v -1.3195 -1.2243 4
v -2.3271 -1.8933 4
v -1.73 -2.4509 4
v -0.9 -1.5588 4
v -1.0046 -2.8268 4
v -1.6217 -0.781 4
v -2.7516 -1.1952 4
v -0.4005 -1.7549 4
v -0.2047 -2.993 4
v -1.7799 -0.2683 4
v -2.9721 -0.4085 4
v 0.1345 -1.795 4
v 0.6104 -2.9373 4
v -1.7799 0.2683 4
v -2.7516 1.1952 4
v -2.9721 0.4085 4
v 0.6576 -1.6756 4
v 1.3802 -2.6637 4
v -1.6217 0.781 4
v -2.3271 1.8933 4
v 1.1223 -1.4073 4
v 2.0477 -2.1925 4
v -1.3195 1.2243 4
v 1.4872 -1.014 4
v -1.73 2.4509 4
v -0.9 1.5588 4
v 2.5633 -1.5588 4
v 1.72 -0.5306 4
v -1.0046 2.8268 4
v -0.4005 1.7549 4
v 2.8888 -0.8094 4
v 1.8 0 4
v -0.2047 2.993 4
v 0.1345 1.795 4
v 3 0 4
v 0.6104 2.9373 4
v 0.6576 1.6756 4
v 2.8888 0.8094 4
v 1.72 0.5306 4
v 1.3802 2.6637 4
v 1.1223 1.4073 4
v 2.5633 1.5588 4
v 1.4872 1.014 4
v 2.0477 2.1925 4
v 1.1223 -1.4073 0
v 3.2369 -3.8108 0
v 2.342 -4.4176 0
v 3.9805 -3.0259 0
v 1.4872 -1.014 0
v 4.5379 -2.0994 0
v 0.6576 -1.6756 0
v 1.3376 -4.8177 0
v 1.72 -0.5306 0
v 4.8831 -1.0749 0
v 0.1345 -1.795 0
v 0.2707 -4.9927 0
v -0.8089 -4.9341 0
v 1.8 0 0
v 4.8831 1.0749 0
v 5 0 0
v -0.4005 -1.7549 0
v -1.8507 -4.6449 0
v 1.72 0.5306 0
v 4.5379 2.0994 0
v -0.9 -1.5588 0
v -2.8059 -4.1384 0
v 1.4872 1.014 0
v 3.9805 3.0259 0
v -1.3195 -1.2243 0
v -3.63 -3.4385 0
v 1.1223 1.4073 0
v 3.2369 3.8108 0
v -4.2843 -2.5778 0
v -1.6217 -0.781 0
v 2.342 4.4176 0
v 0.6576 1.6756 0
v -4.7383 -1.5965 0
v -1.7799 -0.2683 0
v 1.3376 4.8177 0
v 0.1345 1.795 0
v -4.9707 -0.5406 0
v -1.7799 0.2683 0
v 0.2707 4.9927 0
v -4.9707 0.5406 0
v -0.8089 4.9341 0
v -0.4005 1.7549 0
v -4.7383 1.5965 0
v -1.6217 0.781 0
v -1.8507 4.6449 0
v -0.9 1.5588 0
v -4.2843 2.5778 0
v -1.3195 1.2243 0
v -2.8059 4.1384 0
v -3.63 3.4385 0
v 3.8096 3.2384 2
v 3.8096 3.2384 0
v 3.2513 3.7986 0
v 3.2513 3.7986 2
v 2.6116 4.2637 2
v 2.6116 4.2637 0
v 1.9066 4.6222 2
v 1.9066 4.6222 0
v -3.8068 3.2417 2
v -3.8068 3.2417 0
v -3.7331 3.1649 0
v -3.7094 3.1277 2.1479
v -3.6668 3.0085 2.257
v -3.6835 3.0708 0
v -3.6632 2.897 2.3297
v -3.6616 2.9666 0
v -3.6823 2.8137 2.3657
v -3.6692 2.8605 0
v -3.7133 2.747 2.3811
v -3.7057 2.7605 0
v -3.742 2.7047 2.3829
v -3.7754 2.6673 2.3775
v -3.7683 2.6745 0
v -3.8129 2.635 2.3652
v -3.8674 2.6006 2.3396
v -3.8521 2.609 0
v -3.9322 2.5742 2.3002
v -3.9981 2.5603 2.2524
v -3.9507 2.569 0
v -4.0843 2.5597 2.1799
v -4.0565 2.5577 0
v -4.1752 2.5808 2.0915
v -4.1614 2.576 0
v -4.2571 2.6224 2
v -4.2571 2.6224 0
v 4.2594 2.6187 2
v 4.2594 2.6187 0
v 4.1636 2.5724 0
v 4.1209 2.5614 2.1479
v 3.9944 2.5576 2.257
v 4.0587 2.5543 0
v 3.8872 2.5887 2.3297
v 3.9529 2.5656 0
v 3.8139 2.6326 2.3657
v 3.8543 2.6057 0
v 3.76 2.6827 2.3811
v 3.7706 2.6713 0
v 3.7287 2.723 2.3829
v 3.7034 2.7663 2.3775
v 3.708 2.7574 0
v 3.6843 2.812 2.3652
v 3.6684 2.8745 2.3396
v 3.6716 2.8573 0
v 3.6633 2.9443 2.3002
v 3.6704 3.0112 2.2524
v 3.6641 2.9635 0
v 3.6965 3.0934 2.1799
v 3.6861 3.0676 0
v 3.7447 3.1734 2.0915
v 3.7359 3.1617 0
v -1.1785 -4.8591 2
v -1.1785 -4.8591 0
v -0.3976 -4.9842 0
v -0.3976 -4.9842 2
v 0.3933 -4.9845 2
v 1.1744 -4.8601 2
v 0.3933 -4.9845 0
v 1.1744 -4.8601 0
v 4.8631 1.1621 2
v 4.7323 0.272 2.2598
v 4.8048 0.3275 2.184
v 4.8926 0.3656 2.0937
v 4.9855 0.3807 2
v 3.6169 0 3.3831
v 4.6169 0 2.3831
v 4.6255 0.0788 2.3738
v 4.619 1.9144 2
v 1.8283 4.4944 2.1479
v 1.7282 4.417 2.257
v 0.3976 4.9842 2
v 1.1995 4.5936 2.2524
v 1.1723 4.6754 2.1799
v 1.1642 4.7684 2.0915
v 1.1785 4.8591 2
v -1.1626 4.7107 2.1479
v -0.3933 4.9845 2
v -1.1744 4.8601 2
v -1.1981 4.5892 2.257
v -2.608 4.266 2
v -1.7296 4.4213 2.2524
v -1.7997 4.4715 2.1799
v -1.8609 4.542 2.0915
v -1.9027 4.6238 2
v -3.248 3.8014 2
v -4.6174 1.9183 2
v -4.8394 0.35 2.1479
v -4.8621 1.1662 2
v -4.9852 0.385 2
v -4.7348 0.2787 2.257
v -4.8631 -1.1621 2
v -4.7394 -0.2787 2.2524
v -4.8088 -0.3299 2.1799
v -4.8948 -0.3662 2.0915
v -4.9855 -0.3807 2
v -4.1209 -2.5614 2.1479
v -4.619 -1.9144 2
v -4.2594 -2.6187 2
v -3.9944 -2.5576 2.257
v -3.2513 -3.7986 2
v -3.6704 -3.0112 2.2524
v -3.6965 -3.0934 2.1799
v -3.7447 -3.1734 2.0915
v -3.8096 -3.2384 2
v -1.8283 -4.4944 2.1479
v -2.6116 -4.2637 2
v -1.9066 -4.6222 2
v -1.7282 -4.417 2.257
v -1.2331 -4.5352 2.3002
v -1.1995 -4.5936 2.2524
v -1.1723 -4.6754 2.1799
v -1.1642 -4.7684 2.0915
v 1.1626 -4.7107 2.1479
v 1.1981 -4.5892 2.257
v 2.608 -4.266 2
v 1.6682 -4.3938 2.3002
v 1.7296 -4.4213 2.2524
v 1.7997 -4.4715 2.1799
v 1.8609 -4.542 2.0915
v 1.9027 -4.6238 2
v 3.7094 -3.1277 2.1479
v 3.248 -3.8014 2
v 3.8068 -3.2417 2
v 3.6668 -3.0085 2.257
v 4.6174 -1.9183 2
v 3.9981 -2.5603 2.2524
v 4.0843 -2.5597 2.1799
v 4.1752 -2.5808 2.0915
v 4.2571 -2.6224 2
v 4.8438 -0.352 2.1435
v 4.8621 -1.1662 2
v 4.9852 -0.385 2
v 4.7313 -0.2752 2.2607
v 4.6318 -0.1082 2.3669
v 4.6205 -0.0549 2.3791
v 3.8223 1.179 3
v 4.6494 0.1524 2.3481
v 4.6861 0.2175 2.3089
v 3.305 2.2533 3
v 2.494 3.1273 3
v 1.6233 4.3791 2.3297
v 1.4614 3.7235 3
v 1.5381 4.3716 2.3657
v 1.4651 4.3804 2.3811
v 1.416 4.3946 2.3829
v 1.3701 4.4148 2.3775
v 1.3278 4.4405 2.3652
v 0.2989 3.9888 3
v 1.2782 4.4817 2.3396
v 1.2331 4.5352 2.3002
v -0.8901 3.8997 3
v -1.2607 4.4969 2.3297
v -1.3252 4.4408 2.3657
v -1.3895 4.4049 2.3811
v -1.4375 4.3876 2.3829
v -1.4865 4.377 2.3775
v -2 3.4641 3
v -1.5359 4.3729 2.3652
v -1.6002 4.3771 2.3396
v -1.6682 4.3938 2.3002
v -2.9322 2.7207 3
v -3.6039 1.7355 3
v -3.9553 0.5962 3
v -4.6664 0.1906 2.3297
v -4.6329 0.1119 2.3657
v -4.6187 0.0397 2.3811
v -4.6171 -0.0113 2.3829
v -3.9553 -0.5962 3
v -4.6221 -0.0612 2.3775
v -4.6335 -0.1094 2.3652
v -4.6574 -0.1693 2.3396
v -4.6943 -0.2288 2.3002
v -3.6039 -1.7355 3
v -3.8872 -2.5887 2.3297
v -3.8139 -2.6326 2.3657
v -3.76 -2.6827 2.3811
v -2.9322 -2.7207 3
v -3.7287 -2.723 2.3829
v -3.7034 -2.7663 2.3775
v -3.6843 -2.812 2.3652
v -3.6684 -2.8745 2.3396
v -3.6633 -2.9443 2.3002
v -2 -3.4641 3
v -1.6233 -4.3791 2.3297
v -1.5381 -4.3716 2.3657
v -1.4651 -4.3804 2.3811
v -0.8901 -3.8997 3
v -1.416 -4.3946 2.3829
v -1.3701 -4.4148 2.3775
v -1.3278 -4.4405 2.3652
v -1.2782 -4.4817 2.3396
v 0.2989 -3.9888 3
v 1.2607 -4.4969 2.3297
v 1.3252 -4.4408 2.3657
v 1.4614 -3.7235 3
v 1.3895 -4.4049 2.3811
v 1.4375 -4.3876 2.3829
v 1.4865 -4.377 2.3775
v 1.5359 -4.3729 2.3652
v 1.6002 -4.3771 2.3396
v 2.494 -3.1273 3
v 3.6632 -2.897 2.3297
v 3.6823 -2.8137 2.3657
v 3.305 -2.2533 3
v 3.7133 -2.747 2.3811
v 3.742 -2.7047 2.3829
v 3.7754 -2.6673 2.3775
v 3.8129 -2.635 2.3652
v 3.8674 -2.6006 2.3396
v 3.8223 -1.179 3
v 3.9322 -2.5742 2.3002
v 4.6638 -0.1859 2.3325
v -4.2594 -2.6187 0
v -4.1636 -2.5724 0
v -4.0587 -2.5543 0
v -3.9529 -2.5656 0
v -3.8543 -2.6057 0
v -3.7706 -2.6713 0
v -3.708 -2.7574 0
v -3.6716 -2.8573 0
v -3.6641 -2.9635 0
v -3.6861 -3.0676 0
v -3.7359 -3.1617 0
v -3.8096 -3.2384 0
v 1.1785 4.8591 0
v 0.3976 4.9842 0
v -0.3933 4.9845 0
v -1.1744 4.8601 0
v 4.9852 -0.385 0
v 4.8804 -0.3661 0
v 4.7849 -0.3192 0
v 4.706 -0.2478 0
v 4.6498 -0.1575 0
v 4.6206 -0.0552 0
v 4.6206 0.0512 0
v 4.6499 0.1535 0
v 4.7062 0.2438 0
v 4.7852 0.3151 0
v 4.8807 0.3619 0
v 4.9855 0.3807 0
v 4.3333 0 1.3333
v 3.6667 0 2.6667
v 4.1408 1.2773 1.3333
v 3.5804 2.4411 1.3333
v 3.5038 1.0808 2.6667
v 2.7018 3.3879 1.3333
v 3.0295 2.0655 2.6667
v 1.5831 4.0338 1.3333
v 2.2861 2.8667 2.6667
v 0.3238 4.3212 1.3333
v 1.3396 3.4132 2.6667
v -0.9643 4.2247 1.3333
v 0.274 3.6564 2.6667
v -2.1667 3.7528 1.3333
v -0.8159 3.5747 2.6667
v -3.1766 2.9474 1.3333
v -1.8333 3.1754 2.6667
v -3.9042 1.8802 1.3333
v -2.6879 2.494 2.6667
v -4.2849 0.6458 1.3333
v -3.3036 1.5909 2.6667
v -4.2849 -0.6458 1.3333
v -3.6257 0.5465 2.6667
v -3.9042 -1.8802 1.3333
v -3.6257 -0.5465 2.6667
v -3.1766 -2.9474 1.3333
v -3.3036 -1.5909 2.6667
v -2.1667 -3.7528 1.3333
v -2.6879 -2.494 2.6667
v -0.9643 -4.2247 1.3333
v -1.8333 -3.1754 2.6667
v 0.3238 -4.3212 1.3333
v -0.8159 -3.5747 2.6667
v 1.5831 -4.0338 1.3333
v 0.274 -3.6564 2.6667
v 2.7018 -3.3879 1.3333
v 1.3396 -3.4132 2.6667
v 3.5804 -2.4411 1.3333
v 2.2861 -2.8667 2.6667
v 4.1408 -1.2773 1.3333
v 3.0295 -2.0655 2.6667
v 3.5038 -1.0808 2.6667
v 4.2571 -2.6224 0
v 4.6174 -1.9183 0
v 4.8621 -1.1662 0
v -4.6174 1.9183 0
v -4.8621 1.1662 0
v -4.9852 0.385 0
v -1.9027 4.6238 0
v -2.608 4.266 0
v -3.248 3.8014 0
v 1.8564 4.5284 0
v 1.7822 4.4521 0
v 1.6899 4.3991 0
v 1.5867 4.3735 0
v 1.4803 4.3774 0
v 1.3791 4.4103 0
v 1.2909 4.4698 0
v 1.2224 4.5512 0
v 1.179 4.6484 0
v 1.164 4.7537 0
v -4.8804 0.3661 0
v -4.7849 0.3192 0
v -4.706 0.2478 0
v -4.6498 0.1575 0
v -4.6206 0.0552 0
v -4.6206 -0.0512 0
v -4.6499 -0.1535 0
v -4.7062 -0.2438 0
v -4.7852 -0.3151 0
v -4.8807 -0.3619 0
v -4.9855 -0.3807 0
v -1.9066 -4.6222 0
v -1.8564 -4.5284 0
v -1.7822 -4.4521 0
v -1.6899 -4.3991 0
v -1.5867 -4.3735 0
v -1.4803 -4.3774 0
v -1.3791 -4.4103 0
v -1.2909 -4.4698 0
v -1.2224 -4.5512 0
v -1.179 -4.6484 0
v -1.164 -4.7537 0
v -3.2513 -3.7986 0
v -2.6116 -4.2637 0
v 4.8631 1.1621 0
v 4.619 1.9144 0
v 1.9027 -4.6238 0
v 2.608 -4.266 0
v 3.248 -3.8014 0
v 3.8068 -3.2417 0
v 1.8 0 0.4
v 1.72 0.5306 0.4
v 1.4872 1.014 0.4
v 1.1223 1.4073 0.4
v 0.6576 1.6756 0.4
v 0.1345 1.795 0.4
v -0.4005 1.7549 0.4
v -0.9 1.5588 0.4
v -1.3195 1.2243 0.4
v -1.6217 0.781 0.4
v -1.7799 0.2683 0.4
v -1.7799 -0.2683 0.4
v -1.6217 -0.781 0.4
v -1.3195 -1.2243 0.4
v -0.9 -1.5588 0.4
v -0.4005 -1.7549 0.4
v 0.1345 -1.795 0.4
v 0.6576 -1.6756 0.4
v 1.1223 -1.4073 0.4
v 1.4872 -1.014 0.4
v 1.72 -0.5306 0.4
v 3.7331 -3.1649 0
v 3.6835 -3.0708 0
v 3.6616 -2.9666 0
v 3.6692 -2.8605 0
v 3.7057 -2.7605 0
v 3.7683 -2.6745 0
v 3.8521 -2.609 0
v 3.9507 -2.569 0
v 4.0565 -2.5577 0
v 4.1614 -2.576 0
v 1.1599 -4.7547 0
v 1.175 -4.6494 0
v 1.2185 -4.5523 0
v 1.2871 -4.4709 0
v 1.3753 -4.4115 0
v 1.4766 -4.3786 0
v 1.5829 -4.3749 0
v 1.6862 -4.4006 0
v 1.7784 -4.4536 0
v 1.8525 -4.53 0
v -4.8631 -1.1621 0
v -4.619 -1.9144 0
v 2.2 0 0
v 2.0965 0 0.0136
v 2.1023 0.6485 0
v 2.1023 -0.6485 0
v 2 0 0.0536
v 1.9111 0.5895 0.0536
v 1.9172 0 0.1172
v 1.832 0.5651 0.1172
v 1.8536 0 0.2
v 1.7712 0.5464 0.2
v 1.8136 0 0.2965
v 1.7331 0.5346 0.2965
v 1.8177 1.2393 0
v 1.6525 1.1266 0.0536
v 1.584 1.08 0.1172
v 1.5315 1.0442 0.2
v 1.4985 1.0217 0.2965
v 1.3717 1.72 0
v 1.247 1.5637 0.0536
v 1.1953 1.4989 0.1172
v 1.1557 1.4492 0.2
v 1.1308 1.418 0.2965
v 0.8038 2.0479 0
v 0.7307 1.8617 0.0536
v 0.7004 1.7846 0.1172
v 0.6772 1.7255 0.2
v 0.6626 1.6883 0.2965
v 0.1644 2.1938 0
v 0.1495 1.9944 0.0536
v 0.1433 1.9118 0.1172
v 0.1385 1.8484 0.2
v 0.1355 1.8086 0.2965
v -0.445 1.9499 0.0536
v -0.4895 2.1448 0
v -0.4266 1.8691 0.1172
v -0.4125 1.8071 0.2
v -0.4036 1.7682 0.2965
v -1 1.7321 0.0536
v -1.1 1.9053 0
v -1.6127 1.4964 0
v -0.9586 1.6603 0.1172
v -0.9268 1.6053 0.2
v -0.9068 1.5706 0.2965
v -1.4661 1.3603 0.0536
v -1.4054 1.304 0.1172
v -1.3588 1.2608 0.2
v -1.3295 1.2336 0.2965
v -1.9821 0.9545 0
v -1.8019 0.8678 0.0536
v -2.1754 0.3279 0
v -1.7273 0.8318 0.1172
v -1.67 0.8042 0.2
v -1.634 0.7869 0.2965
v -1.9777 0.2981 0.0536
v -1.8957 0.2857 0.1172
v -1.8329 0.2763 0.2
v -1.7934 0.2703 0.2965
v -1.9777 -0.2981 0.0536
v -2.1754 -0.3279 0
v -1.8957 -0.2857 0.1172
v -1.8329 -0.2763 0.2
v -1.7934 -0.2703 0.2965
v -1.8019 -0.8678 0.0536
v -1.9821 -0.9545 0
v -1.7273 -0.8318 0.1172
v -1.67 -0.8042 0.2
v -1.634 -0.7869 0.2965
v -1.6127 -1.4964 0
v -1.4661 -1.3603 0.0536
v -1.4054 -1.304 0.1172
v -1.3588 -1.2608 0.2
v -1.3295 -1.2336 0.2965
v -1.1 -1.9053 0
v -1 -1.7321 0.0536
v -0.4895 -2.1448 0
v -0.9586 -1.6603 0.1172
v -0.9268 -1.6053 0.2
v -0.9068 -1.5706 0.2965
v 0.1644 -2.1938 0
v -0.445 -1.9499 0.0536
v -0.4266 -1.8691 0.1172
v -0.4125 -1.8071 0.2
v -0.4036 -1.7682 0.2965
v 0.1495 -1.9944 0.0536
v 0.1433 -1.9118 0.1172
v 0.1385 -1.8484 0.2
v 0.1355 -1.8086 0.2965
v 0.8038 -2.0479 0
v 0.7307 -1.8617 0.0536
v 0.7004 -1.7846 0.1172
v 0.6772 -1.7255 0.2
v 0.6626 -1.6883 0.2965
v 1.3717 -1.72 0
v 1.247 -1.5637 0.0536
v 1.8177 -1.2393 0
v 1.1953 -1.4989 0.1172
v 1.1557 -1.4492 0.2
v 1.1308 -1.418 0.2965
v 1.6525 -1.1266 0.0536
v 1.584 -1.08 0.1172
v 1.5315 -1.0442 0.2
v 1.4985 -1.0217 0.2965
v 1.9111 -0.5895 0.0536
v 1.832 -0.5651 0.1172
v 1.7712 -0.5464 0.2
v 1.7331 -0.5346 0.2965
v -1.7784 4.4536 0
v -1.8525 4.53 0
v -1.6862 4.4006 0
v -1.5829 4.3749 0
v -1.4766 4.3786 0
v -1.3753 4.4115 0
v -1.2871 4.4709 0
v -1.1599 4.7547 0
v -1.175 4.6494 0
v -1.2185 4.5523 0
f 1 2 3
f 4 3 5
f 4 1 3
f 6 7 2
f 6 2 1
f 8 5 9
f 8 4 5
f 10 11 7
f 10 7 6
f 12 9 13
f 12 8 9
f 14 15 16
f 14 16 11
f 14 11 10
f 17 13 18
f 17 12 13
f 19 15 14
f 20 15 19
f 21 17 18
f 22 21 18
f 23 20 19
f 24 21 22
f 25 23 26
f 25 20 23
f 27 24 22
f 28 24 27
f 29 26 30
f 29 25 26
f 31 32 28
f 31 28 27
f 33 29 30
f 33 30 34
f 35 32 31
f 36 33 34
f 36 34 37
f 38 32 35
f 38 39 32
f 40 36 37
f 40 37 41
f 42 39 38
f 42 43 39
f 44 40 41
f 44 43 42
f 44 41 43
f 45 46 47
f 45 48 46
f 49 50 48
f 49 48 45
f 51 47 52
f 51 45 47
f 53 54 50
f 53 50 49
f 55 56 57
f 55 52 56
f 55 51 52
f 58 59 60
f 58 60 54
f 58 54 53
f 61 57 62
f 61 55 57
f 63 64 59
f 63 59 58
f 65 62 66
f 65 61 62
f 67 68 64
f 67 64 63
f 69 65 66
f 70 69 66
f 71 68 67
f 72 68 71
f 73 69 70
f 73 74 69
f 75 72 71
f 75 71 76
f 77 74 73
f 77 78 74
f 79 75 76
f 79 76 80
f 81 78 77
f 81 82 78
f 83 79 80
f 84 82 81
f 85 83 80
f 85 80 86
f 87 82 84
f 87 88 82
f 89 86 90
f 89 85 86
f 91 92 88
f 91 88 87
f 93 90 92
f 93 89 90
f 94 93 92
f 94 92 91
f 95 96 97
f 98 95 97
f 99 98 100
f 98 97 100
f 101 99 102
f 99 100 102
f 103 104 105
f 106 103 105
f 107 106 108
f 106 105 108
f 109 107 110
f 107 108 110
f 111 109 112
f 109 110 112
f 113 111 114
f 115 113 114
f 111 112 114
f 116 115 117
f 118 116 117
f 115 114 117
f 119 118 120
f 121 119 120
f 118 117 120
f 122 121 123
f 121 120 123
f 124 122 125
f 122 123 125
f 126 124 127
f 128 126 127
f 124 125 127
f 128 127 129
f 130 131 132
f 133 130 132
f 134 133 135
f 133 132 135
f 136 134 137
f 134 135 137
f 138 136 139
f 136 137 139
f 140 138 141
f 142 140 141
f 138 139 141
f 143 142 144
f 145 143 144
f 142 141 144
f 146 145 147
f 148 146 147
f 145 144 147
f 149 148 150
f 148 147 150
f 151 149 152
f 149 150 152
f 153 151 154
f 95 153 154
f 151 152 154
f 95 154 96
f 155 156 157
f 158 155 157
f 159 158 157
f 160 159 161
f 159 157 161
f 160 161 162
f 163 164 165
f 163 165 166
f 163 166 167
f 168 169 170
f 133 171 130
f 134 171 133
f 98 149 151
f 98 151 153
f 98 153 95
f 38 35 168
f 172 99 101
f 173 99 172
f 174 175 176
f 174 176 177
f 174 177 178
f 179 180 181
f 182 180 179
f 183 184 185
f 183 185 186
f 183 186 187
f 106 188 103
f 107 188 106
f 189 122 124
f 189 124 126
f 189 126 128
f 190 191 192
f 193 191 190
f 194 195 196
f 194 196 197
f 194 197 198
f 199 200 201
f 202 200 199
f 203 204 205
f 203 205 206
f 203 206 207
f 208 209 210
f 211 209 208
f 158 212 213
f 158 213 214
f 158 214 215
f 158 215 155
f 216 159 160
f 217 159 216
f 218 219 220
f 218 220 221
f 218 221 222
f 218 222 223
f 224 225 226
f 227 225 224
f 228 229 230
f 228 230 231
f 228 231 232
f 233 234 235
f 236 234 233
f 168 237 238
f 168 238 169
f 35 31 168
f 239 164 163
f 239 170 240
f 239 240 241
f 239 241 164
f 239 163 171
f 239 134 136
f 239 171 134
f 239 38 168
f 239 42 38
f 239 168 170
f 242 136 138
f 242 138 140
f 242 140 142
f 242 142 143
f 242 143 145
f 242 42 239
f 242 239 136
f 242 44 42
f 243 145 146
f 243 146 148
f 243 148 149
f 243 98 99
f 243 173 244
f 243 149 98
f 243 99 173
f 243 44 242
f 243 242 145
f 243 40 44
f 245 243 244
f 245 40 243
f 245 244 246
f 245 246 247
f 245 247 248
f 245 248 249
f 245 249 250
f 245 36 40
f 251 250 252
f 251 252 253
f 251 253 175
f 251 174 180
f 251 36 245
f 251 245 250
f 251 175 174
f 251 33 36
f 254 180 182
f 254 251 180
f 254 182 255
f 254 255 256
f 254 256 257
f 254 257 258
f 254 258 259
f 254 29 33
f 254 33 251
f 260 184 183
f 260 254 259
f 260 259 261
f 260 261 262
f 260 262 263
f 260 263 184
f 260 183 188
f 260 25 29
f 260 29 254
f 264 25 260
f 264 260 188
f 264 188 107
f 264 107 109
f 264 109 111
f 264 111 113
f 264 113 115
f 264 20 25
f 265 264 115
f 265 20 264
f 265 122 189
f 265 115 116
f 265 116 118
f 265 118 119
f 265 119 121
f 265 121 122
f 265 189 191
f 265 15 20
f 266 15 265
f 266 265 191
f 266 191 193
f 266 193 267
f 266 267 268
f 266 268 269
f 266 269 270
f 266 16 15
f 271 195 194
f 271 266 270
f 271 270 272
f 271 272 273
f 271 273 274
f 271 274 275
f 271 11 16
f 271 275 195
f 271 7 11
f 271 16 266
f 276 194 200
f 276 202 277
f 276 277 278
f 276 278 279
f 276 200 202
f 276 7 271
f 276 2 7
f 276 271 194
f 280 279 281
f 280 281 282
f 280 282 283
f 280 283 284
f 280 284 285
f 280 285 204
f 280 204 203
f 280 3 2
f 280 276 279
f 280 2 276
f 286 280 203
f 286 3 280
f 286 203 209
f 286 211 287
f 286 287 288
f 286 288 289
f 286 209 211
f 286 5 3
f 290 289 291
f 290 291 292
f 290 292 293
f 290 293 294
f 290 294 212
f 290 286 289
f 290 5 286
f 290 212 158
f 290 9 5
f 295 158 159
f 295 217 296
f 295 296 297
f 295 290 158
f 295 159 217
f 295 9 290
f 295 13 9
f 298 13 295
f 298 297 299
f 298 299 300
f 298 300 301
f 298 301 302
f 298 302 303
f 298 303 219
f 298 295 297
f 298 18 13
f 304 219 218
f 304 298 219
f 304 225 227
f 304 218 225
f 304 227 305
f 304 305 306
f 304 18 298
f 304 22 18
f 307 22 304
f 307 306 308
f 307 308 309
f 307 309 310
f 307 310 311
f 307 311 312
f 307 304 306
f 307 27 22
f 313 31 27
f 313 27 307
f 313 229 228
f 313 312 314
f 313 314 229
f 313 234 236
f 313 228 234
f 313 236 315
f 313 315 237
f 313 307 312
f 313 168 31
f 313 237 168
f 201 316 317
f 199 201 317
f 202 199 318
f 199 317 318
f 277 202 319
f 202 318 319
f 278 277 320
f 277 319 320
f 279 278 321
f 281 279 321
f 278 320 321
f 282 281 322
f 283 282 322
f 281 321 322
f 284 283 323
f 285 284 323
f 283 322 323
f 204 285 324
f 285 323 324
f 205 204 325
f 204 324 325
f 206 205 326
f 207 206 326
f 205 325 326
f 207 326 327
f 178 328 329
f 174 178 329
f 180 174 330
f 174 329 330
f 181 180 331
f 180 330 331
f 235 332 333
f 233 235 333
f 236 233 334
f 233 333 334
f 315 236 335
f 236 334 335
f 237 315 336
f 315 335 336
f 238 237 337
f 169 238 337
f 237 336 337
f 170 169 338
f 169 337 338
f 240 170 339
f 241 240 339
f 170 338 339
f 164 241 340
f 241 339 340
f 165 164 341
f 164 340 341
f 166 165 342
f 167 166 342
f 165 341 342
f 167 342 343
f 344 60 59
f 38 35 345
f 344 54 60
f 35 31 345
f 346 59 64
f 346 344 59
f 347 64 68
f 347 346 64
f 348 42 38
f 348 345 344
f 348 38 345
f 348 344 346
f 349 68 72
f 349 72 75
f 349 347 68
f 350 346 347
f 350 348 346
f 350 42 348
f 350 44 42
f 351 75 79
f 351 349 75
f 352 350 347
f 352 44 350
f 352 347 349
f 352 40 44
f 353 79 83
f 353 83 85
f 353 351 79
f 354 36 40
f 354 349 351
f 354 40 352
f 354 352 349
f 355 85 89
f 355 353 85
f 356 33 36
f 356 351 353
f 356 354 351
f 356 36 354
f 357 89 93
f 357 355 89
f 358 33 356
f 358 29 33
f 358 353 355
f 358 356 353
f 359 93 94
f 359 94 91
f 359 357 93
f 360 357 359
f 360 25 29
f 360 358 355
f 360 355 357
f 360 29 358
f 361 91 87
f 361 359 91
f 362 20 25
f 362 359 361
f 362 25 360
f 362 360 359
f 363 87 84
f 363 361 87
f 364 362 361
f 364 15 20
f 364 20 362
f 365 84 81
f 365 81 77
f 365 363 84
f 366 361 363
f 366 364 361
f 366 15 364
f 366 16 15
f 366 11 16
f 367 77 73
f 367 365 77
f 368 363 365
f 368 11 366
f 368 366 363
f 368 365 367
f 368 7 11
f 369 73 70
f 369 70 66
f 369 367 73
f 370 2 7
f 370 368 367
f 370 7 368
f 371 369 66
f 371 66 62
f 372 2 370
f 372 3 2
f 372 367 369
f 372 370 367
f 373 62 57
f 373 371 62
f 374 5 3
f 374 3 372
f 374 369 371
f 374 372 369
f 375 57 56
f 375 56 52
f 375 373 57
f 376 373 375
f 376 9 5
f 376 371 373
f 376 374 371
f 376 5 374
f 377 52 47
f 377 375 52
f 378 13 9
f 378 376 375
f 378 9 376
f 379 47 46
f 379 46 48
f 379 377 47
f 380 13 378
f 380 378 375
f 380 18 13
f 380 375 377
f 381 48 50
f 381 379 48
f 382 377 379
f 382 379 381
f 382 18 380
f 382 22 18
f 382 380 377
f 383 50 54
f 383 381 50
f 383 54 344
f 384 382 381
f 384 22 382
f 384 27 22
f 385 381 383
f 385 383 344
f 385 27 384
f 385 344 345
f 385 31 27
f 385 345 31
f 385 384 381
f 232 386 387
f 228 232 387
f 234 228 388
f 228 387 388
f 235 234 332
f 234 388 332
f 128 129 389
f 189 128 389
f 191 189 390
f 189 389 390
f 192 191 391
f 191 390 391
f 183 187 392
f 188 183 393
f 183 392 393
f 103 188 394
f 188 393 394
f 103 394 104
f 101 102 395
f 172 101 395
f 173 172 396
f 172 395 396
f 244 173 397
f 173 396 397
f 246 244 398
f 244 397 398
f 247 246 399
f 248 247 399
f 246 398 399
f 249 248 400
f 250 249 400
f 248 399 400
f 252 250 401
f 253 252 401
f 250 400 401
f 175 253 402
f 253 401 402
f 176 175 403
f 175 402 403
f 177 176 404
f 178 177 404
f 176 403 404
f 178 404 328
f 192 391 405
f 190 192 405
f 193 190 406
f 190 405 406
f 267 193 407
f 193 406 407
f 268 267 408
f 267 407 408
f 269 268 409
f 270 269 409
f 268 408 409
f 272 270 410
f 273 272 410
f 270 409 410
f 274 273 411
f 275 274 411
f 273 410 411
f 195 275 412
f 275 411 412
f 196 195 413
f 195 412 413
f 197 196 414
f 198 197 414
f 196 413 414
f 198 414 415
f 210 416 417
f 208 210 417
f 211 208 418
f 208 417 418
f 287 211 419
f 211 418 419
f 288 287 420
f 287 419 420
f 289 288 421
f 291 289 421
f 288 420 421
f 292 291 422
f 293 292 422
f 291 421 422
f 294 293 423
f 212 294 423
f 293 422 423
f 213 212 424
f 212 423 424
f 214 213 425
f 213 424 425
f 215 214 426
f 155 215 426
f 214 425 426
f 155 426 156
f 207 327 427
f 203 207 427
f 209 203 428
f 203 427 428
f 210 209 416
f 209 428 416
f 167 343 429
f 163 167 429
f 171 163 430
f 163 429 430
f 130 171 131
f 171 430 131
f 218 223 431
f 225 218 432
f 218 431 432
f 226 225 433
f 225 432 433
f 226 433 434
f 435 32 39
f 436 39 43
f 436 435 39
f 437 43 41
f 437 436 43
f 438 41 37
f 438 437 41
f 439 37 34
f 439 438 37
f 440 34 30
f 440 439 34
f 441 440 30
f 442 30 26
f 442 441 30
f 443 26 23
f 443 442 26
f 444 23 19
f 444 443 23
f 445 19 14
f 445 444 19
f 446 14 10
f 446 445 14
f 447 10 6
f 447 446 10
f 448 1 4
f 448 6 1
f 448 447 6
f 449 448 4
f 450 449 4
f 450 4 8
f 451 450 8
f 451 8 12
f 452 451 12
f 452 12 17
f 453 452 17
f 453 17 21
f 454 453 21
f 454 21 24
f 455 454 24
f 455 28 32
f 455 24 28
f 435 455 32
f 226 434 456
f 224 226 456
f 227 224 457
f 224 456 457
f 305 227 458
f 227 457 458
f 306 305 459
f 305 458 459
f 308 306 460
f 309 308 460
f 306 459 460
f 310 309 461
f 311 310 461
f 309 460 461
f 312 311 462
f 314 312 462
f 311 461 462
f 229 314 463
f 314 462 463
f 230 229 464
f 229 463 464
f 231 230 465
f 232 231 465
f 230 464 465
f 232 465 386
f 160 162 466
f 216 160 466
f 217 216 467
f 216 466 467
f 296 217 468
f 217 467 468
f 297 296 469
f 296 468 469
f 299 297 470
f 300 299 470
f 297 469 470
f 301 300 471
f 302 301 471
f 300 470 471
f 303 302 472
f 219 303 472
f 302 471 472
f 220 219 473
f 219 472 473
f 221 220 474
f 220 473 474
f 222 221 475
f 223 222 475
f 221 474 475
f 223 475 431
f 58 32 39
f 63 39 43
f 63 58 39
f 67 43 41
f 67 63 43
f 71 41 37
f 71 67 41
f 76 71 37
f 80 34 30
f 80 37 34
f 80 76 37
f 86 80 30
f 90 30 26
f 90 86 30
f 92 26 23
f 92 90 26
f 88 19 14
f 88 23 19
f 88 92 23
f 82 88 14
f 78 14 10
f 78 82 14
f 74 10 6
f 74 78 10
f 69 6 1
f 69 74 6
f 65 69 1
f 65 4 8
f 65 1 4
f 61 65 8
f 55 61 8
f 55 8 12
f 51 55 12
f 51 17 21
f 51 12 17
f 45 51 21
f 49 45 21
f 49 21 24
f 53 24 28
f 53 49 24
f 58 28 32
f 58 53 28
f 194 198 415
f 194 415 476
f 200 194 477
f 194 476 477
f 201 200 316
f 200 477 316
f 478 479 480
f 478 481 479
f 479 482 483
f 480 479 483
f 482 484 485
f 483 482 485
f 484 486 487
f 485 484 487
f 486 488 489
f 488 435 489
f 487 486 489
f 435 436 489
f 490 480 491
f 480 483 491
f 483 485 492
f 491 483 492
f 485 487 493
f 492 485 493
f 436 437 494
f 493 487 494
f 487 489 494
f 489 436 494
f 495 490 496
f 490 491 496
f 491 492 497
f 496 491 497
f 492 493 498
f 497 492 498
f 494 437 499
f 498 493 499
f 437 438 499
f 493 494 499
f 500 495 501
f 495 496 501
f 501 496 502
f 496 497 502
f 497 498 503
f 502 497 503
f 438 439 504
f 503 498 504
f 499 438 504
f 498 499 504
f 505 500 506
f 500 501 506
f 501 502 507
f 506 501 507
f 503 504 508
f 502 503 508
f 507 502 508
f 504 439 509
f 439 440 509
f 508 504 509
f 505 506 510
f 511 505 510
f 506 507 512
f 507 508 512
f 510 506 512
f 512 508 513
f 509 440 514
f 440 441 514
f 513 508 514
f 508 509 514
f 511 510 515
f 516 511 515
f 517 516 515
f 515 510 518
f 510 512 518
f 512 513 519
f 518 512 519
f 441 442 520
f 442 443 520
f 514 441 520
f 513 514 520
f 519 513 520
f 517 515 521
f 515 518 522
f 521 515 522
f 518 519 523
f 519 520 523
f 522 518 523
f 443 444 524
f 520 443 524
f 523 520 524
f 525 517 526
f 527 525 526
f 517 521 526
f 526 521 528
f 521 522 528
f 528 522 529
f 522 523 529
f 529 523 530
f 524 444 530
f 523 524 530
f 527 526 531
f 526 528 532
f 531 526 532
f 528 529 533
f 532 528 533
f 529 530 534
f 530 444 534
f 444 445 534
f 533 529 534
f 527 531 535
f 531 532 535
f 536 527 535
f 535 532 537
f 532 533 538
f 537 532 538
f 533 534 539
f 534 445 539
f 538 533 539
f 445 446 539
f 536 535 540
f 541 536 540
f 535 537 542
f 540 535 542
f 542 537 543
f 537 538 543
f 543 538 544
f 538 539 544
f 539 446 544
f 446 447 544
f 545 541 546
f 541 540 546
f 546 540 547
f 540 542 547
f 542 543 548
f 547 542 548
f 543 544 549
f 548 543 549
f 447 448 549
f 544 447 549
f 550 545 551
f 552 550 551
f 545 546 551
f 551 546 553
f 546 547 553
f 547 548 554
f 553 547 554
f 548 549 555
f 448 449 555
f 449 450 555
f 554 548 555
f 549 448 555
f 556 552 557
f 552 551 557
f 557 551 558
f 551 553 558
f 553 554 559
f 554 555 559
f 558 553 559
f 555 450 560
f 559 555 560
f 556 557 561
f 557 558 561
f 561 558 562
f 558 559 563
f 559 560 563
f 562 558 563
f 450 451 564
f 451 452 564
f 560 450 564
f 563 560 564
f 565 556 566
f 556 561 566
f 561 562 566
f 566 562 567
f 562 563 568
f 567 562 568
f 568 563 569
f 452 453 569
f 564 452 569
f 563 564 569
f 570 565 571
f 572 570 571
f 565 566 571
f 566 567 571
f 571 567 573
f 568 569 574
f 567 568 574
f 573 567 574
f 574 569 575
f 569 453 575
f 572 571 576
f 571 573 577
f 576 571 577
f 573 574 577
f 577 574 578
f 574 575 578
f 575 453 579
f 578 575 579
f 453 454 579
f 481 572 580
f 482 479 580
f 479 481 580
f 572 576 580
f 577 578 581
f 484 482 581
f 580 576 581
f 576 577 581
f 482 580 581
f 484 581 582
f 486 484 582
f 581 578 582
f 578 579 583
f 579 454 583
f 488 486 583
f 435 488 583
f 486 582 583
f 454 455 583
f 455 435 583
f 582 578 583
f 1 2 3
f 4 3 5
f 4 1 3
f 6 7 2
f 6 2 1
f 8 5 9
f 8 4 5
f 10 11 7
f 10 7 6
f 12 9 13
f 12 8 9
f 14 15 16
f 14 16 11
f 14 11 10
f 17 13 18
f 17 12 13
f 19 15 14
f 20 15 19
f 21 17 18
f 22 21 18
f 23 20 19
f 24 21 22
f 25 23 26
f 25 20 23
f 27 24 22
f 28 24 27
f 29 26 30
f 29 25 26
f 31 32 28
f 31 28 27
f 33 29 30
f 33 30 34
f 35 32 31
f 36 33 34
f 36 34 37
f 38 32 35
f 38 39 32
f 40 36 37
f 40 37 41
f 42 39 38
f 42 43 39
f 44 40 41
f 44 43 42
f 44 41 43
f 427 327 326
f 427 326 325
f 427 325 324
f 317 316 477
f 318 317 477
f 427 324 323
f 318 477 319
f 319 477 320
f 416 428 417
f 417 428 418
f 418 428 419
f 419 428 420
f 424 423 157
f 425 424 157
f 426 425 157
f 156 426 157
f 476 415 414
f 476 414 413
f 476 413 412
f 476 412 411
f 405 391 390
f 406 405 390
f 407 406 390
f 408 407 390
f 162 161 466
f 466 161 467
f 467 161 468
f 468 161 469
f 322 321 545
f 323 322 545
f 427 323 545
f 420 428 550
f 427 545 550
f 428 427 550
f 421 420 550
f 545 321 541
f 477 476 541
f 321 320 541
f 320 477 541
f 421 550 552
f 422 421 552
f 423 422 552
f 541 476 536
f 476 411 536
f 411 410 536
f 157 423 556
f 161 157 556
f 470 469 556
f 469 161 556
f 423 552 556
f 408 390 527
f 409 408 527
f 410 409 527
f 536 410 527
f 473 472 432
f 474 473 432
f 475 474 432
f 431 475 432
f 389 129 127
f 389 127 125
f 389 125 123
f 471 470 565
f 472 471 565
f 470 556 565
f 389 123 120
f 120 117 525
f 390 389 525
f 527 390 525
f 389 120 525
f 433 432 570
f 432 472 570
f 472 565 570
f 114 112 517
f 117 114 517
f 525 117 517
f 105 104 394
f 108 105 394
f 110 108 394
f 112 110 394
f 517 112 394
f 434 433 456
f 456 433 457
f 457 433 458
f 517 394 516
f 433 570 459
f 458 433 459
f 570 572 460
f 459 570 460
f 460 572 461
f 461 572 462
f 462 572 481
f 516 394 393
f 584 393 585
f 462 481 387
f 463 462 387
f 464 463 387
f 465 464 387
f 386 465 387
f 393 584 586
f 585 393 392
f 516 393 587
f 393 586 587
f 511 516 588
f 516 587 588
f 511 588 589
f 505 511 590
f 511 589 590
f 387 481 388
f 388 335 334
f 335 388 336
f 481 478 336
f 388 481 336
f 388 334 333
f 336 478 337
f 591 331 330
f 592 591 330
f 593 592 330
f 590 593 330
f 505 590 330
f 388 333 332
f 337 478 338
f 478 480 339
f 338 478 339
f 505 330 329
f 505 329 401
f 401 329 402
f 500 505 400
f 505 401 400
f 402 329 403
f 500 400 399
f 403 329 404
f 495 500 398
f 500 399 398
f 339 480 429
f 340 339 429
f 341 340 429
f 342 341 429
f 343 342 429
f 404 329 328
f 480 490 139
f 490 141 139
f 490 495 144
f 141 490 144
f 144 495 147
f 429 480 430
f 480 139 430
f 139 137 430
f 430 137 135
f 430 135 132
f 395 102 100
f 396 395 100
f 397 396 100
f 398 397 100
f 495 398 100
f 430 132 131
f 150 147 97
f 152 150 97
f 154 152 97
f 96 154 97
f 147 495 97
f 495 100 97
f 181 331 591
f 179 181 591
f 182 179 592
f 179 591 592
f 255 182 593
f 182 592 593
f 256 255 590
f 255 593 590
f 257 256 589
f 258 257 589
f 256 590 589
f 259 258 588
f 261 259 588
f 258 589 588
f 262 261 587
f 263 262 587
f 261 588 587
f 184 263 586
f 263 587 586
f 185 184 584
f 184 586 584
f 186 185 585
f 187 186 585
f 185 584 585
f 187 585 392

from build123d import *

# Parameters (mm, degrees)
CYLINDER_R         = 1.8
CYLINDER_DEPTH     = 10
CYLINDER002_R      = 1.8
CYLINDER002_DEPTH  = 10
CYLINDER001_R      = 5
CYLINDER001_DEPTH  = 4
CHAMFER_SIZE       = 2
FILLET_R           = 0.4
POCKET_DEPTH       = 33.3948769134
POLARPATTERN_COUNT = 10


with BuildPart() as cilindro:
    # Cylinder → Cylinder (new body)
    with BuildSketch(Plane.XY):
        Circle(CYLINDER_R)
    extrude(amount=CYLINDER_DEPTH)


with BuildPart() as cut:
    # Cone → Cone (revolve)
    with BuildSketch(Plane.XZ):
        Polygon((0, 0), (5, 0), (3, 4), (0, 4), align=None)
    revolve(axis=Axis((0, 0, 0), (0, 0, 1)))

    # Cut: cut Cilindro
    add(cilindro.part, mode=Mode.SUBTRACT)


with BuildPart() as cilindro002:
    # Cylinder002 → Cylinder002 (new body)
    with BuildSketch(Plane.XY):
        Circle(CYLINDER002_R)
    extrude(amount=CYLINDER002_DEPTH)


with BuildPart() as body:
    # Cylinder001 → Cylinder001 (new body)
    with BuildSketch(Plane.XY):
        Circle(CYLINDER001_R)
    extrude(amount=CYLINDER001_DEPTH)

    # Cut001: cut Cilindro002
    add(cilindro002.part, mode=Mode.SUBTRACT)

    # Chamfer
    chamfer_edges = [body.edges().sort_by_distance(p)[0] for p in [
        (-5, 0, 4),
    ]]
    chamfer(chamfer_edges, length=CHAMFER_SIZE)

    # Fillet
    fillet_edges = [body.edges().sort_by_distance(p)[0] for p in [
        (-1.8, 0, 0),
    ]]
    fillet(fillet_edges, radius=FILLET_R)

    # CopySketch002 → Pocket (cut, through all)
    with BuildSketch(Plane(origin=(0, 0, 0), x_dir=(-1, 0, 0), z_dir=(0, 0, -1))):
        with BuildLine():
            ThreePointArc((-4.9851565937, -0.3849853717), (-4.6168735744, -0.0019824857), (-4.9854853807, 0.3807039776))
            ThreePointArc((-4.9854853807, 0.3807039776), (-4.999999539, -0.002147), (-4.9851565937, -0.3849853717))
        make_face()
    pocket = extrude(amount=-POCKET_DEPTH, mode=Mode.SUBTRACT)

    # PolarPattern: Pocket ×10 about axis
    polarpattern_axis = Axis((0, 0, 0), (0, 0, -1))
    for i in range(1, POLARPATTERN_COUNT):
        add(pocket.rotate(polarpattern_axis, i * 360 / POLARPATTERN_COUNT), mode=Mode.SUBTRACT)


solid = Compound([cut.part, body.part])
